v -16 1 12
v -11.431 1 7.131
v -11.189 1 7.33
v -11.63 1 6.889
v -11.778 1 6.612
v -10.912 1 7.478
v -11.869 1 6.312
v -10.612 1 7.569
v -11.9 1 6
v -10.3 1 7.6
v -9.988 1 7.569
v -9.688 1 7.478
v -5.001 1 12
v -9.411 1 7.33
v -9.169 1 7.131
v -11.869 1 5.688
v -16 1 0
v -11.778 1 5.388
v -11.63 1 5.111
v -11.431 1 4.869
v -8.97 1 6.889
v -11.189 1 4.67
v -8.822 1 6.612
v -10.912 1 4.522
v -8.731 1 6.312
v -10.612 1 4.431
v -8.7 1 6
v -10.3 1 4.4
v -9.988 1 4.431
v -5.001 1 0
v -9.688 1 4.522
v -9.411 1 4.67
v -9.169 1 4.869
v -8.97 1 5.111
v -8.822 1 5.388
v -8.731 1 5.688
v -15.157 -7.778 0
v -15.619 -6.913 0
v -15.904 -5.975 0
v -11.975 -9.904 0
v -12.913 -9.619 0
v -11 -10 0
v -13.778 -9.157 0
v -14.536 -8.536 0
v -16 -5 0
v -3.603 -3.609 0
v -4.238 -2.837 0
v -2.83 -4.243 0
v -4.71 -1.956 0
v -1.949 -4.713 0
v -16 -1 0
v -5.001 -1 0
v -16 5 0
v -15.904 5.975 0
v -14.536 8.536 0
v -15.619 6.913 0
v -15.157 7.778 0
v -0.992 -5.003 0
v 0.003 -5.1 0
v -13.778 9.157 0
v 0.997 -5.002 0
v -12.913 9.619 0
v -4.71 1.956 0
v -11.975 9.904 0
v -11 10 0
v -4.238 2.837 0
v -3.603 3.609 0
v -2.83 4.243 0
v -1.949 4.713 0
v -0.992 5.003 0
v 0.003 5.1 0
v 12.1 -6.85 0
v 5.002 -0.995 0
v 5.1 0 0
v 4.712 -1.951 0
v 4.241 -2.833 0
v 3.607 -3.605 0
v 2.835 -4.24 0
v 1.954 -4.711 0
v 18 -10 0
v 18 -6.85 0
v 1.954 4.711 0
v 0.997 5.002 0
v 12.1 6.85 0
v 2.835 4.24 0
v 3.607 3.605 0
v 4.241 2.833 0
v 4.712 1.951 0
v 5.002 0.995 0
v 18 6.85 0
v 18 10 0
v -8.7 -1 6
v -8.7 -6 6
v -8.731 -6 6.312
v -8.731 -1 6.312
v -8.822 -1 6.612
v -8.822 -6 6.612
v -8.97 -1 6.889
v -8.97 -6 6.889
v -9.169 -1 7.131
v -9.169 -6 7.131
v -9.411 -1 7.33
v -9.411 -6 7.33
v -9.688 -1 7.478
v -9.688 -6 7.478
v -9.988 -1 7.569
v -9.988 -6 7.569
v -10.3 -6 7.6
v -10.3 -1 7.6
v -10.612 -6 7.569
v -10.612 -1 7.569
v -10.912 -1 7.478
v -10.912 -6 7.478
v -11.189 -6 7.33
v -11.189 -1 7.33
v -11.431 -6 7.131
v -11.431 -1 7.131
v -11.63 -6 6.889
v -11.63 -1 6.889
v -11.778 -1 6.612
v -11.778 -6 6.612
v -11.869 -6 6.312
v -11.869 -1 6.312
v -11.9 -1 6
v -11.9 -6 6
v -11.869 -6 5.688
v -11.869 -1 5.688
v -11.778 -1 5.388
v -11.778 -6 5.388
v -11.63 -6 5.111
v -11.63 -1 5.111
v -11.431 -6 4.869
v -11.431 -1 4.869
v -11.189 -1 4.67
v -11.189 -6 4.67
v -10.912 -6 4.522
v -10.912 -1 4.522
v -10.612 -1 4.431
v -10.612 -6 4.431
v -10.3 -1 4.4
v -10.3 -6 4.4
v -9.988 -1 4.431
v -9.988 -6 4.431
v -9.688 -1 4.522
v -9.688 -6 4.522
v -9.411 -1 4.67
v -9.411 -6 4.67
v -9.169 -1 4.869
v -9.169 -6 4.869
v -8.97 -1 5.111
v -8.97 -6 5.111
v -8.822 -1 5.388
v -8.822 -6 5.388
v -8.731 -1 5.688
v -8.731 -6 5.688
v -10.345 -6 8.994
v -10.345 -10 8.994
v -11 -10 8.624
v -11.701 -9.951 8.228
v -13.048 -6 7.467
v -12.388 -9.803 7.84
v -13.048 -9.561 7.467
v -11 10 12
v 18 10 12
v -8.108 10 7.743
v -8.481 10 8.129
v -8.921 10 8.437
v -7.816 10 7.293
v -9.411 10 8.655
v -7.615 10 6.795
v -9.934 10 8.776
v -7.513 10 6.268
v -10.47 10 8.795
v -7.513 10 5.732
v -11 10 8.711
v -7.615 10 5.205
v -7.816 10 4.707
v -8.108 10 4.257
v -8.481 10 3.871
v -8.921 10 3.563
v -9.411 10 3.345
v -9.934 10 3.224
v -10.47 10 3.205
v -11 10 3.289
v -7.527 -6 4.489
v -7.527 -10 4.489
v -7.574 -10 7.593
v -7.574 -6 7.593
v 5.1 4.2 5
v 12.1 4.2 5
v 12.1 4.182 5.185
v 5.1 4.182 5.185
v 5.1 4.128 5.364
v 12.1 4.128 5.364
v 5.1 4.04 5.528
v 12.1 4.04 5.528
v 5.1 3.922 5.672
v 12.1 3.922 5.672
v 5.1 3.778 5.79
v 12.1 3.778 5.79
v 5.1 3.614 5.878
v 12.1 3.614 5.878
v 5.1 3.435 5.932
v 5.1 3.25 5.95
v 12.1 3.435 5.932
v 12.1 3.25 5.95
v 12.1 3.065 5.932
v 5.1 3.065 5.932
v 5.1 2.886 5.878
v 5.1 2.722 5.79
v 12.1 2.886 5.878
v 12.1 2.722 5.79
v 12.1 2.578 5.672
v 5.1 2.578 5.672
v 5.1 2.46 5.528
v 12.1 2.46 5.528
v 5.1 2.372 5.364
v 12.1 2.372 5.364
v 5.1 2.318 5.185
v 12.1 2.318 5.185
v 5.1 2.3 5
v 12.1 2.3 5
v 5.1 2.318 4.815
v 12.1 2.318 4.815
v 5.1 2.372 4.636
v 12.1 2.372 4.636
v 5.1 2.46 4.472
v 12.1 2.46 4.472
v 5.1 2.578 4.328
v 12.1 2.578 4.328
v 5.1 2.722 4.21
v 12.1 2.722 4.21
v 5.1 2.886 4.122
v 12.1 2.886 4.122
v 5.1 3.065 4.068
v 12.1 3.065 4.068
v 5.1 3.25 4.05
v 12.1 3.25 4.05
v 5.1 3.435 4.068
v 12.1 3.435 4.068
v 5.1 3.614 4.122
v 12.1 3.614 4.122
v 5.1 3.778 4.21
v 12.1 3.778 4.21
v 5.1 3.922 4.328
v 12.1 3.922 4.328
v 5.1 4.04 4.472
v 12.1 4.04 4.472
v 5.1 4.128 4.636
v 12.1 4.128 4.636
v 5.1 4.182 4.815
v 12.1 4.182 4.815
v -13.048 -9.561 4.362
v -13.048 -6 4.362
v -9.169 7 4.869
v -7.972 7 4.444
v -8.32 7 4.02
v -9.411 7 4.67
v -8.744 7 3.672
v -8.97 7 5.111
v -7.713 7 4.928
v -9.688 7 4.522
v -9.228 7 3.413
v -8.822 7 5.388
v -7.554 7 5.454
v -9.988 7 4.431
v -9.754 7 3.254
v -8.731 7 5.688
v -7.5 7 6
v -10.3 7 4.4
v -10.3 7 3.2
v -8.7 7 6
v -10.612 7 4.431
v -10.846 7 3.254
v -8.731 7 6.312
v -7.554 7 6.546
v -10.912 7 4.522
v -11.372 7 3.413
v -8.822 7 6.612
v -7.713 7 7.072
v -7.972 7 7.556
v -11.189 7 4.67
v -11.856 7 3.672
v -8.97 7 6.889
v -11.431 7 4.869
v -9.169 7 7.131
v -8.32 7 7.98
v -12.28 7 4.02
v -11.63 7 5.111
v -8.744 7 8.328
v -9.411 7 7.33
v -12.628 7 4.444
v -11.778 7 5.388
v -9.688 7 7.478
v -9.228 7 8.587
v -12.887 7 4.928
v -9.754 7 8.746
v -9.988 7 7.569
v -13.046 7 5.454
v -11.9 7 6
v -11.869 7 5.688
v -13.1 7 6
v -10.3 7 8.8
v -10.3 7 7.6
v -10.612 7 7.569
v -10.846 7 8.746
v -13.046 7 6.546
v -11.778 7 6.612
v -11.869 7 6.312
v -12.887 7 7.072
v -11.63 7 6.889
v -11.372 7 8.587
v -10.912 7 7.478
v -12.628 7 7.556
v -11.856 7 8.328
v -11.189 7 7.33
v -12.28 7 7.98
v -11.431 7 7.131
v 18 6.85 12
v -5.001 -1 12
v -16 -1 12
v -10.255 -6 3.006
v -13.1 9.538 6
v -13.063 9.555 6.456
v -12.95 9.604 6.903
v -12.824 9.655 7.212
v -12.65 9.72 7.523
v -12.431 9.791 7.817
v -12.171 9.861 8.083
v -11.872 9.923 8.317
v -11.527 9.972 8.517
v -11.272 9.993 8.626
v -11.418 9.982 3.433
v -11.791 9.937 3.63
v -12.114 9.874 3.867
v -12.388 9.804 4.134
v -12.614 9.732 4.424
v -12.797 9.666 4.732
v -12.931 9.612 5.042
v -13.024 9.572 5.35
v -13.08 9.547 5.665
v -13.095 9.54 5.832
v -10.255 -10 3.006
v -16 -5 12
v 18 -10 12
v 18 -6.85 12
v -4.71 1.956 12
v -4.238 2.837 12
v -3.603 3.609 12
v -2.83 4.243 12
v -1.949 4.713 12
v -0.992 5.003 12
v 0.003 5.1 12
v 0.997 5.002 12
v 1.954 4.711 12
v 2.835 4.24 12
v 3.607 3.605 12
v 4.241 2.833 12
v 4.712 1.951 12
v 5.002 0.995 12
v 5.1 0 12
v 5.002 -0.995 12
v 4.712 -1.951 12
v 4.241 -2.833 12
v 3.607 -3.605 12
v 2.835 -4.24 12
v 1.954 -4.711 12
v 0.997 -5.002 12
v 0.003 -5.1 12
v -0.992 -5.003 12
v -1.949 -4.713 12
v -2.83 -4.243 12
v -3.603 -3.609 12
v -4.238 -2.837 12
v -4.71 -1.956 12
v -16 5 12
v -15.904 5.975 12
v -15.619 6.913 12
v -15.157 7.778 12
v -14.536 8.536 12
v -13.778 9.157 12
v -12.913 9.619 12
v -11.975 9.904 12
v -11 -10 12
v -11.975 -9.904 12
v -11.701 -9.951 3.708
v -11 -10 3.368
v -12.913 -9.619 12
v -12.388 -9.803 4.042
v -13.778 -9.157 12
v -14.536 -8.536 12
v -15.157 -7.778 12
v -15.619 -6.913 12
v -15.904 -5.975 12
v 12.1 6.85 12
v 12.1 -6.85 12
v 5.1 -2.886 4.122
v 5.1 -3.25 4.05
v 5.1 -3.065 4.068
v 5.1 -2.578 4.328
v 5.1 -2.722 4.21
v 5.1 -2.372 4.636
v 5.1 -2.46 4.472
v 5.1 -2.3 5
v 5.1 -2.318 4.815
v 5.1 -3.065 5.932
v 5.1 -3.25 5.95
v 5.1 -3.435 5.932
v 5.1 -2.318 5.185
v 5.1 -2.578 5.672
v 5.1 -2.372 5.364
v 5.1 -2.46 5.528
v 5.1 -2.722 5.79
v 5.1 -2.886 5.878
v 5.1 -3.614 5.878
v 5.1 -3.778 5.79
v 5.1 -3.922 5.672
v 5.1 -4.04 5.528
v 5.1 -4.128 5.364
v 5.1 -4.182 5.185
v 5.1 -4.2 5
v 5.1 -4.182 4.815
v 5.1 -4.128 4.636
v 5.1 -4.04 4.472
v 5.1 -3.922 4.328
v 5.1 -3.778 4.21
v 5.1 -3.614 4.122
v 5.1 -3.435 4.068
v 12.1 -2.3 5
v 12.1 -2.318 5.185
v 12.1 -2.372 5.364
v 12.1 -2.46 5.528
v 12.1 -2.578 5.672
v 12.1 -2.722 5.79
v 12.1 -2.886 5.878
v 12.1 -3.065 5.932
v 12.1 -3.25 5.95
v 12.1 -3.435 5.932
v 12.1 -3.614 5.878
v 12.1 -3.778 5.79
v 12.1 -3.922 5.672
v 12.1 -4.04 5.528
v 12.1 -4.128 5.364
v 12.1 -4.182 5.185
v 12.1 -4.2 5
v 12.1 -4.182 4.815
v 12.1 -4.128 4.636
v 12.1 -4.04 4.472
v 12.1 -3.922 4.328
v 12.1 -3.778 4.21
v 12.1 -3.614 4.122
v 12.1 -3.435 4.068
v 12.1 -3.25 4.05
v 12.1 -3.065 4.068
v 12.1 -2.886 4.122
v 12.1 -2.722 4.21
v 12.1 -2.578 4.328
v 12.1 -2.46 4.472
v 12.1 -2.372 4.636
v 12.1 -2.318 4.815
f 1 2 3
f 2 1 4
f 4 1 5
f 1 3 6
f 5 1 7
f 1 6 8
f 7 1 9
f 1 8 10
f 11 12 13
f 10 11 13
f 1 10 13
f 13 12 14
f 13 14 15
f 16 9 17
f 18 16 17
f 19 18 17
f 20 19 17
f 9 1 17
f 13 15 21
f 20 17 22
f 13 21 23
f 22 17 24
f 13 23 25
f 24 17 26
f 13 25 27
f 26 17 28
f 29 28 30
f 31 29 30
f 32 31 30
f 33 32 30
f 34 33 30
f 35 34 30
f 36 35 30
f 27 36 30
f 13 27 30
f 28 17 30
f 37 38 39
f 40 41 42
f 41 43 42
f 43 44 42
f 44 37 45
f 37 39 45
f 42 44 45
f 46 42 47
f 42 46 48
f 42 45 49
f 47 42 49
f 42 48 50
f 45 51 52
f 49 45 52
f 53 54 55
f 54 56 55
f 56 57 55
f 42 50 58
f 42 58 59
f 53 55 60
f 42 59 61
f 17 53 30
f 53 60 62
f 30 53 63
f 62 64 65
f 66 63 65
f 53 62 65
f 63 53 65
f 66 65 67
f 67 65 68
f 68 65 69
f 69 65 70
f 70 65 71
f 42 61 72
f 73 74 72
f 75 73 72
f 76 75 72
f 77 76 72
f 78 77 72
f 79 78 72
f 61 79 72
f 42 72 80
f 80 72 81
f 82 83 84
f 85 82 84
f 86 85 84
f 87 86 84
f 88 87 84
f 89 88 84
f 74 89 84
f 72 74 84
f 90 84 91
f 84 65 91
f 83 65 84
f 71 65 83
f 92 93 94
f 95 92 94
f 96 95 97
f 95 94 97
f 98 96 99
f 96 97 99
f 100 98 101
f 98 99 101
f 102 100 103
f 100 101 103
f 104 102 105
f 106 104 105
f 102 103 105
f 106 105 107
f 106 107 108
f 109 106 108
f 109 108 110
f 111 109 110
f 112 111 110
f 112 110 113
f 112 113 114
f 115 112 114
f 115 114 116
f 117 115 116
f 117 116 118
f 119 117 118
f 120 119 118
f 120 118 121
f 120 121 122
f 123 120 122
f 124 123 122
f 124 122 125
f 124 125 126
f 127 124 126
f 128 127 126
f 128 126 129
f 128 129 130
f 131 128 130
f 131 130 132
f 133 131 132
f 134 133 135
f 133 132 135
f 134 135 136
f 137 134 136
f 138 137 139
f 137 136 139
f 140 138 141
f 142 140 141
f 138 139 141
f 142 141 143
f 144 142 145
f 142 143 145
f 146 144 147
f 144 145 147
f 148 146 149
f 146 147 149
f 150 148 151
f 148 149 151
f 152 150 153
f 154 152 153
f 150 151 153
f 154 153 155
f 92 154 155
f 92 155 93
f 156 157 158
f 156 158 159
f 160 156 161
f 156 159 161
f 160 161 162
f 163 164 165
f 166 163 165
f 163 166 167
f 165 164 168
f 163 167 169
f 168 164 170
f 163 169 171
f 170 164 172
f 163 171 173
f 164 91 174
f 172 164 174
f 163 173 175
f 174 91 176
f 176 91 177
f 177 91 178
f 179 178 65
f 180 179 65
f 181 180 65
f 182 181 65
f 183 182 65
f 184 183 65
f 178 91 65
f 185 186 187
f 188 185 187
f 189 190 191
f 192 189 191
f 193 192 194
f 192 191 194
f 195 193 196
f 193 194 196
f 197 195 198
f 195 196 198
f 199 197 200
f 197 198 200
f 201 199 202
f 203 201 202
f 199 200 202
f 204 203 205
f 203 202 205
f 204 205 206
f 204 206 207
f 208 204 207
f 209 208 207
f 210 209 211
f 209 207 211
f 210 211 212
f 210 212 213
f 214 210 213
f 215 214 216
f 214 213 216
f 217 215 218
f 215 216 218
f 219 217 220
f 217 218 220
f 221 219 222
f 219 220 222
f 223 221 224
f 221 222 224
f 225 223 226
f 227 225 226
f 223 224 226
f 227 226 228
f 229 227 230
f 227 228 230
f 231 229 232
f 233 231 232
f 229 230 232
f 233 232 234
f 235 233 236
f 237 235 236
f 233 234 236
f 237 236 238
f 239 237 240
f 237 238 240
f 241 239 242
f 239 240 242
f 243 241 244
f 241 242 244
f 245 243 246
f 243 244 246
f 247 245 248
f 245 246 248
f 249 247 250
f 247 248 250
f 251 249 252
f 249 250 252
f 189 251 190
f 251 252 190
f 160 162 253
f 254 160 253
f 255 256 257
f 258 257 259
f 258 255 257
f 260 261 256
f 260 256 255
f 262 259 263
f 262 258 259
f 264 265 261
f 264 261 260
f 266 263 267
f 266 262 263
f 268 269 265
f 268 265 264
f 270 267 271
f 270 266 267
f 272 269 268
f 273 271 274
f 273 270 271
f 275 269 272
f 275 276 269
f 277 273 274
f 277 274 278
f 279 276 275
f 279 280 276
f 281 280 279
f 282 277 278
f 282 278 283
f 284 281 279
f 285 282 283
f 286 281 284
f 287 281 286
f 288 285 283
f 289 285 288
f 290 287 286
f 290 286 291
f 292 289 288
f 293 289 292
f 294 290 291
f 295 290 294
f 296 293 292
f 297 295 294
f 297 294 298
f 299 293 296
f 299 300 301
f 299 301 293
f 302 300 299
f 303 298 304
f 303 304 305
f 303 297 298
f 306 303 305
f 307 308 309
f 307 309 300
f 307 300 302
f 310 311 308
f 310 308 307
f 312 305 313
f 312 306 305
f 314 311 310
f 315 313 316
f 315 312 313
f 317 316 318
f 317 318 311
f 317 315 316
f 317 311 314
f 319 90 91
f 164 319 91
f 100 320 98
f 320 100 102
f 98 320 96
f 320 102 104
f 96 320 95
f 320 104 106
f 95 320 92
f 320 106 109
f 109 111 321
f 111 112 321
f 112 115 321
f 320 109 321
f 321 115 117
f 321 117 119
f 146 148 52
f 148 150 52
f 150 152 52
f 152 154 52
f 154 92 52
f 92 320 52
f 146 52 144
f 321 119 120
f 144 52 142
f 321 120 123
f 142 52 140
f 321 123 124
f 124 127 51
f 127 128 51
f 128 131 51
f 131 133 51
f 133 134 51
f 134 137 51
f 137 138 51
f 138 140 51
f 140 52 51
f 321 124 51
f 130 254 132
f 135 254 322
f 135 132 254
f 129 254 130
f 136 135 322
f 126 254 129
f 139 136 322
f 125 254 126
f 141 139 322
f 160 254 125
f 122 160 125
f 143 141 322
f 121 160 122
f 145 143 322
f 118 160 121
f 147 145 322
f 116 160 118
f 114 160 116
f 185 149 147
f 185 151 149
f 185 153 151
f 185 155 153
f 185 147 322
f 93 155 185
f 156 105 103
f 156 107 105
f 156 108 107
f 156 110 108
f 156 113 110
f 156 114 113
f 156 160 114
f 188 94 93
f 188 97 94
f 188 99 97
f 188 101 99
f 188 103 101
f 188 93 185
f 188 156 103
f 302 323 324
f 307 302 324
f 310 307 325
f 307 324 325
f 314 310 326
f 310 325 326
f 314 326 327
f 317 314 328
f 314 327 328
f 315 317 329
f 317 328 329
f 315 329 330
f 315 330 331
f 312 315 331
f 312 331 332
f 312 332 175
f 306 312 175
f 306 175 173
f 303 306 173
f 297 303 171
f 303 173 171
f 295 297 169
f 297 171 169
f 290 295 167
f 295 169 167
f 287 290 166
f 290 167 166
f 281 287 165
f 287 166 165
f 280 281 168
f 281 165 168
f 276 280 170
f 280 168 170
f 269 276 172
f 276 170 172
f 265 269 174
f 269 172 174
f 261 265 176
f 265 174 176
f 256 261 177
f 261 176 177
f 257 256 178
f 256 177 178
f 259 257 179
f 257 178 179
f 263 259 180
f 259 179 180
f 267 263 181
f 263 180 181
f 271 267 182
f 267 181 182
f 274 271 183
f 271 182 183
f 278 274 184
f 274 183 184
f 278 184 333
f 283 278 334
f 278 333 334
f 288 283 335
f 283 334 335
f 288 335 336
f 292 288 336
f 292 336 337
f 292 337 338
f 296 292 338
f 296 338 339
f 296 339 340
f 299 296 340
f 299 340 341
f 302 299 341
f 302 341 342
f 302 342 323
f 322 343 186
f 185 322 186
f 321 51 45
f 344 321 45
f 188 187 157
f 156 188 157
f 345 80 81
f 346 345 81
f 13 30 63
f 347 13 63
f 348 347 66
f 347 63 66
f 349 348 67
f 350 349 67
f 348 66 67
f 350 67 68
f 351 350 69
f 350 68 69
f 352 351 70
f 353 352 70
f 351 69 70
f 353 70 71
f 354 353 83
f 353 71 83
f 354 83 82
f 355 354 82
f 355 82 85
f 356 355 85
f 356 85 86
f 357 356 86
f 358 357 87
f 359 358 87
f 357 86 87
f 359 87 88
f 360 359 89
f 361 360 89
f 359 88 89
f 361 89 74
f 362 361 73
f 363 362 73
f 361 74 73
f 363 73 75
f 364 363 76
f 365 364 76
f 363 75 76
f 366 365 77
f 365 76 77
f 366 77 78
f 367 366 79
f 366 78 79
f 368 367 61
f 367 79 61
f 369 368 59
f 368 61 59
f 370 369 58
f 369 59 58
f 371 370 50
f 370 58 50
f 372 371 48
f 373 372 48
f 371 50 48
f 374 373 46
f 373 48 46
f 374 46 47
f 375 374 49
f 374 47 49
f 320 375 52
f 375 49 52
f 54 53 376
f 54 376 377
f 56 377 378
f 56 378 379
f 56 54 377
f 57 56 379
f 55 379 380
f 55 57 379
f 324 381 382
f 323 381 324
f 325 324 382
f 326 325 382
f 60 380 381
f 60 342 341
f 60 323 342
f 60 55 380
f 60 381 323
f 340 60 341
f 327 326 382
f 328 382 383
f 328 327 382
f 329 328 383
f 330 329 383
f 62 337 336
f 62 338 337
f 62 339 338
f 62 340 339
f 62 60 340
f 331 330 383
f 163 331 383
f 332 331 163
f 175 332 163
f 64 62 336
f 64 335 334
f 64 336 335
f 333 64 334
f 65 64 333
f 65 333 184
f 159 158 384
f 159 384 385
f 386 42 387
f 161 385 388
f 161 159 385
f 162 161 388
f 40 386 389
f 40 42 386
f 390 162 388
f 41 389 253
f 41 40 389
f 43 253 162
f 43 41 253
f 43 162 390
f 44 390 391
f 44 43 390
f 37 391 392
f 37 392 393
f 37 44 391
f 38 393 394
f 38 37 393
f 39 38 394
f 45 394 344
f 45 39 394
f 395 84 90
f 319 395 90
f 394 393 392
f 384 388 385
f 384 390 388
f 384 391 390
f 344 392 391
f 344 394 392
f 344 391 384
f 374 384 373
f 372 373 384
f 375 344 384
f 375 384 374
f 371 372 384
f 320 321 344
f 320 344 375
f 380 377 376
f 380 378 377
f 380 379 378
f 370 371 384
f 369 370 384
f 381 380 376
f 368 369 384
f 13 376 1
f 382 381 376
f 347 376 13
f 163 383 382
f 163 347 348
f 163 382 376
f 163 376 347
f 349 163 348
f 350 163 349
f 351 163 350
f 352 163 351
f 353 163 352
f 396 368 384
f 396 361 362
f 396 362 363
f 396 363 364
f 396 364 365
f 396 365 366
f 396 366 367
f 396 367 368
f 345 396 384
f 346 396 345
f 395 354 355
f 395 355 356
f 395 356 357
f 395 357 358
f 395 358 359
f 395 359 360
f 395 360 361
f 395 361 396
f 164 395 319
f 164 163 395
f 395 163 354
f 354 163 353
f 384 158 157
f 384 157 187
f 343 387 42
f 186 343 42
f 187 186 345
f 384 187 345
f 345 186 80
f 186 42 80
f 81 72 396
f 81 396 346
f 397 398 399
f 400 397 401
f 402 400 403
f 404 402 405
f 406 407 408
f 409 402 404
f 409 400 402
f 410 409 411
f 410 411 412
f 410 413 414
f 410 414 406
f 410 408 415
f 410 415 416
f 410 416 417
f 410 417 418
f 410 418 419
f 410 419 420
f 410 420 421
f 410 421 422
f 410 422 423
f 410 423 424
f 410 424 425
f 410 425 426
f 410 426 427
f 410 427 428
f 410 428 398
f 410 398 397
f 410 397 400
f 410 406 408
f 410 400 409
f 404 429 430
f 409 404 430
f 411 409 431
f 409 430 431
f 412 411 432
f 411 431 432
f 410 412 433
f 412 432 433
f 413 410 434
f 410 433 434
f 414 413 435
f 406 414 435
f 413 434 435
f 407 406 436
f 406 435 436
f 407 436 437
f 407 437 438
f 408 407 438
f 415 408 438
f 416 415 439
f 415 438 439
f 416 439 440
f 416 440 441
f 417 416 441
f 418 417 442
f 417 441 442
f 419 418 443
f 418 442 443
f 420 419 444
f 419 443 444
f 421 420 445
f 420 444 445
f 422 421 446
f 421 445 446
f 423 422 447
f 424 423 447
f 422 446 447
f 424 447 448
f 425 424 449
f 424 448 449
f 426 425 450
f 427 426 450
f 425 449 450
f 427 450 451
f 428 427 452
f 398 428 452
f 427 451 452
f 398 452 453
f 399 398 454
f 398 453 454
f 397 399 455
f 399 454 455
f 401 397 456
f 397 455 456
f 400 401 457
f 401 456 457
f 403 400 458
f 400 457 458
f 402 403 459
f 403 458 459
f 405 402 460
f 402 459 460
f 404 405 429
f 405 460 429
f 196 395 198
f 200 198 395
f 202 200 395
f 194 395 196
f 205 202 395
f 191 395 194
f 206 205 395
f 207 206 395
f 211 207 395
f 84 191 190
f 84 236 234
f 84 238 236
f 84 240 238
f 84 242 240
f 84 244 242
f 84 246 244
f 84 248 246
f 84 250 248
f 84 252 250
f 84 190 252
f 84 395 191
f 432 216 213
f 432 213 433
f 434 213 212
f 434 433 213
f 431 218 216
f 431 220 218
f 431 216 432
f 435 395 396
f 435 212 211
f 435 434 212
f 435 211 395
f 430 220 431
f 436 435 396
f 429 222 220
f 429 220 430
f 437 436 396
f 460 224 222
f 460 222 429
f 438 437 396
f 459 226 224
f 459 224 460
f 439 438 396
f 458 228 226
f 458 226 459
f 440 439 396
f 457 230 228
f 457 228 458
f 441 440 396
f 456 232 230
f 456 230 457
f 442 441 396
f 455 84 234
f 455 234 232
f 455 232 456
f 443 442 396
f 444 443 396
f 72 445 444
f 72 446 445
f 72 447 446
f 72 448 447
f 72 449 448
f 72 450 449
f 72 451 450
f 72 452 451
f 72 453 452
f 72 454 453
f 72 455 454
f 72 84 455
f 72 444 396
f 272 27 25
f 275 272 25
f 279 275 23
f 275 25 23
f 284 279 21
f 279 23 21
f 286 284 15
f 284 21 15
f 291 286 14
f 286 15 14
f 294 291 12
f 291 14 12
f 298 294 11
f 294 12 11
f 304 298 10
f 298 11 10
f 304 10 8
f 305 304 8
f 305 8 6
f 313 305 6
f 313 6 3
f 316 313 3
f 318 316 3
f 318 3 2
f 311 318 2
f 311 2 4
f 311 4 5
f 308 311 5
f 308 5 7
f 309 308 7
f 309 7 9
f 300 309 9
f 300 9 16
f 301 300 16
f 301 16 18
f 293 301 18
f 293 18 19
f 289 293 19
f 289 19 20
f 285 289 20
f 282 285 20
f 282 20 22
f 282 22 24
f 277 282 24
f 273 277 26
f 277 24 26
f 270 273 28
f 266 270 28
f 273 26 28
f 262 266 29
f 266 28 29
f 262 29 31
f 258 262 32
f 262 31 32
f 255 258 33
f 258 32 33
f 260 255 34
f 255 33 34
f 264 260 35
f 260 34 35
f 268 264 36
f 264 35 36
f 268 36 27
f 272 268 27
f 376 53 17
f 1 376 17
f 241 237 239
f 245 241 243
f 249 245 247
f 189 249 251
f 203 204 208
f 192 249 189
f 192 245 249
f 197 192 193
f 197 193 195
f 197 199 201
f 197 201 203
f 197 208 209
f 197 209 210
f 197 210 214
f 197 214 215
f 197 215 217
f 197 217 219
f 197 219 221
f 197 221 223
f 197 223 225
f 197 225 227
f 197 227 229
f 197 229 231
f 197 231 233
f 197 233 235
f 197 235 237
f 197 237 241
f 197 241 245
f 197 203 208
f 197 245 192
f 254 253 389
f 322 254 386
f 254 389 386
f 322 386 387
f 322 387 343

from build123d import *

# Parameters (mm, degrees)
F1_DEPTH     = 12
F2_W         = 5.9
F2_H         = 13.7
F3_DEPTH     = 12.001
F4_R         = 1.6
F5_DEPTH     = 20.001
F6_R         = 0.95
F7_DEPTH     = 7
F9_DEPTH     = 4
F10_R        = 2.8
F11_DEPTH    = 3
F12_T1_DEPTH = 37


# Not quite as in the source:
# - a fillet or chamfer that OpenCascade refuses, or shapes differently, is made with other operations: its cross-section is extruded or revolved along the edge and cut away or added


with BuildPart() as f1:
    # F0 (on Top) → F1 (new body)
    with BuildSketch(Plane.XY):
        with BuildLine():
            Line((18, 10), (-16, 10))
            Line((-16, 10), (-16, 1))
            Line((-16, 1), (-5.0009999, 1))
            ThreePointArc((-5.0009999, 1), (5.1, 0), (-5.0009999, -1))
            Line((-5.0009999, -1), (-16, -1))
            Line((-16, -1), (-16, -10))
            Line((-16, -10), (18, -10))
            Line((18, -10), (18, -6.85))
            Line((18, -6.85), (18, 6.85))
            Line((18, 6.85), (18, 10))
        make_face()
    extrude(amount=F1_DEPTH)

    # F2 (on face) → F3 (cut, through all)
    with BuildSketch(Plane(origin=(0, 0, 0), x_dir=(1, 0, 0), z_dir=(0, 0, -1))):
        with Locations((15.05, 0)):
            Rectangle(F2_W, F2_H)
    extrude(amount=-F3_DEPTH, mode=Mode.SUBTRACT)

    # F4 (on face) → F5 (cut, through all)
    with BuildSketch(Plane.XZ.offset(10)):
        with Locations((-10.3, 6)):
            Circle(F4_R)
    extrude(amount=-F5_DEPTH, mode=Mode.SUBTRACT)

    # F6 (on face) → F7 (cut)
    with BuildSketch(Plane.YZ.offset(12.1)):
        with Locations((-3.25, 5)):
            Circle(F6_R)
        with Locations((3.25, 5)):
            Circle(F6_R)
    extrude(amount=-F7_DEPTH, mode=Mode.SUBTRACT)

    # F8 (on face) → F9 (cut)
    with BuildSketch(Plane.XZ.offset(10)):
        Polygon((-7.5270084947, 4.4889189478), (-7.5736076532, 7.5934053818), (-10.3445898285, 8.994), (-13.0481386516, 7.4672939832), (-13.0481386516, 4.3624578361), (-10.2550660504, 3.006451588), align=None)
    extrude(amount=-F9_DEPTH, mode=Mode.SUBTRACT)

    # F10 (on face) → F11 (cut)
    with BuildSketch(Plane(origin=(0, 10, 0), x_dir=(-1, 0, 0), z_dir=(0, 1, 0))):
        with Locations((10.3, 6)):
            Circle(F10_R)
    extrude(amount=-F11_DEPTH, mode=Mode.SUBTRACT)

    # F12: fillet of radius 5 on 2 edges, made by hand

    # F12_s2 → F12_t1 (cut)
    with BuildSketch(Plane.XY.offset(-12.5)):
        with BuildLine():
            ThreePointArc((-11, -10), (-14.5355339059, -8.5355339059), (-16, -5))
            Line((-16, -5), (-16, -10))
            Line((-16, -10), (-11, -10))
        make_face()
        with BuildLine():
            ThreePointArc((-16, 5), (-14.5355339059, 8.5355339059), (-11, 10))
            Line((-11, 10), (-16, 10))
            Line((-16, 10), (-16, 5))
        make_face()
    extrude(amount=F12_T1_DEPTH, mode=Mode.SUBTRACT)


solid = f1.part
